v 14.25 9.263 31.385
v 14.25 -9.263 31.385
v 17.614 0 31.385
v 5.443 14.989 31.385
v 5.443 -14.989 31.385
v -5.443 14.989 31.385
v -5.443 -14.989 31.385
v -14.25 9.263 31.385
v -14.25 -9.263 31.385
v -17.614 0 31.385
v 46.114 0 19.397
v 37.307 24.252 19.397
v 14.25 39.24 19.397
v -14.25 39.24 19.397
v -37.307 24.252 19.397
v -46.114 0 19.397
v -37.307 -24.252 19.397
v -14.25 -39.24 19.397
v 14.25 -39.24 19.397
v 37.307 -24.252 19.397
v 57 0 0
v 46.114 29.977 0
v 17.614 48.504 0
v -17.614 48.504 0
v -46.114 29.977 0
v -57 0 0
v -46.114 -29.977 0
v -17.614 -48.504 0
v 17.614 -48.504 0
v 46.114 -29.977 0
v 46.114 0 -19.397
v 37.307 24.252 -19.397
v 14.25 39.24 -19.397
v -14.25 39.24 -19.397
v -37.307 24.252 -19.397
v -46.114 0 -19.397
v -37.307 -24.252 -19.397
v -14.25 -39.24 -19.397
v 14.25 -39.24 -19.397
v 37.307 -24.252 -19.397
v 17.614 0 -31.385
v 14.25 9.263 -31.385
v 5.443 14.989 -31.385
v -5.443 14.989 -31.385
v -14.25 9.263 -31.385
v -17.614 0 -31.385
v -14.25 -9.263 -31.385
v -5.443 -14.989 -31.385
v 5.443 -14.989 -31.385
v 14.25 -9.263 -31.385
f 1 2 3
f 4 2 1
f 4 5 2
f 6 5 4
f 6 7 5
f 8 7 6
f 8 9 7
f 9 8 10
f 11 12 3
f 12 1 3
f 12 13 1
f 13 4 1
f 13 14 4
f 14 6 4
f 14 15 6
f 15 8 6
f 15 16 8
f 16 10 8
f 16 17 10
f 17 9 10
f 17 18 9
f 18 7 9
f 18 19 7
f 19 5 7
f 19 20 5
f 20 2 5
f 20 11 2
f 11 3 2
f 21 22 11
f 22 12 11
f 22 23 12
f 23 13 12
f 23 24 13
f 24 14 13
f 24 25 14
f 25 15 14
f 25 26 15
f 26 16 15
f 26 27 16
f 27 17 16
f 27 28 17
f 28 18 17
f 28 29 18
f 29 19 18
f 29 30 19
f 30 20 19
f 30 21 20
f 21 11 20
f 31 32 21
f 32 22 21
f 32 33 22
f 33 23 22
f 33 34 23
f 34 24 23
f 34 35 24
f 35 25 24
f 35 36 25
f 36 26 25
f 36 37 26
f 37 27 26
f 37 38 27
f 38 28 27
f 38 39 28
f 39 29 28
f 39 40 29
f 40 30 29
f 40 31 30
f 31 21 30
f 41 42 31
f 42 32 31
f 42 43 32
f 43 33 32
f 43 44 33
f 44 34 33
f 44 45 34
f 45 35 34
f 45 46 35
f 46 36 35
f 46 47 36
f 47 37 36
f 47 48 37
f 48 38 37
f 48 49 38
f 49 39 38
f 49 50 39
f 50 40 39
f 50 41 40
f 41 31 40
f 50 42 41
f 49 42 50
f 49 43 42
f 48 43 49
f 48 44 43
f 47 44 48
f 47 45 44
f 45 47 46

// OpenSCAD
// Generated by SolidPython 1.0.1 on 2020-07-29 00:46:54


scale(v = [19, 17, 11]) {
	sphere(r = 3);
}
/***********************************************
*********      SolidPython code:      **********
************************************************
 
# import packages: SolidPython
from solid import *
from solid.utils import *
from itertools import chain, combinations, permutations


class Resize:

    def __init__(self, scad_file):
        self.scad_file = scad_file
        #self.scad_file = import_scad(scad_file)
        # cone/cylinder param:
        self.r1 = 0
        self.r2 = 0
        self.h = 0
        # rectangular prism param:
        self.w = 0
        self.l = 0
        # ellipse param:
        self.r = 0

    # import OpenScad code (file name corresponds to shape)


    # classify shape + parameters
    def assign(self, param1, param2, param3):
        if self.scad_file == 'cone.scad':
            self.r1 = param1
            self.r2 = param2
            self.h = param3
        elif self.scad_file == 'cylinder.scad':
            self.r1 = param1
            self.r2 = param2
            self.h = param3
        elif self.scad_file == 'rectangularPrism.scad':
            self.h = param1
            self.l = param2
            self.w = param3
        else:
            self.r = param1
            self.h = param2

    # resize parameters
    def iterate(self):
        x = range(3, 20, 2)
        i = 1
        if self.scad_file == 'cone.scad':
            tempList = list(permutations(x, 2))
            for temp in tempList:
                param1 = temp[0]
                param2 = temp[1]
                filepath = 'produced_scad_files/' + 'cone' + str(param1) + '_' + str(param2) + '_' + '.scad'
                scad_render_to_file(cylinder(h=param1, r1=param2, r2=0), filepath)

        elif self.scad_file == 'cylinder.scad':
            tempList = list(permutations(x, 3))
            for temp in tempList:
                param1 = temp[0]
                param2 = temp[1]
                filepath = 'produced_scad_files/' + 'cylinder' + str(param1) + '_' + str(param2) + '_' + '.scad'
                scad_render_to_file(cylinder(h=param1, r1=param2, r2=param2), filepath)

        elif self.scad_file == 'rectangularPrism.scad':
            tempList = list(permutations(x, 3))
            for temp in tempList:
                param1 = temp[0]
                param2 = temp[1]
                param3 = temp[2]
                filepath = 'produced_scad_files/' + 'rectangularPrism' + str(param1) + '_' + str(param2) + '_' + str(
                    param3) + '.scad'
                scad_render_to_file(cube(size=(param1, param2, param3)), filepath)

        elif self.scad_file == 'ellipse.scad':
            tempList = list(permutations(x, 4))
            for temp in tempList:
                param1 = temp[0]
                param2 = temp[1]
                param3 = temp[2]
                param4 = temp[3]
                filepath = 'produced_scad_files/' + 'ellipse' + str(param1) + '_' + str(param2) + '_' + str(param3) + '_' + str(param4) + '.scad'
                scad_render_to_file(scale([param1, param2, param3])(sphere(r=param4)), filepath)

    def render_to_scadfile(self):
        scad_render_to_file(scad, 'example.scad') 
 
************************************************/
